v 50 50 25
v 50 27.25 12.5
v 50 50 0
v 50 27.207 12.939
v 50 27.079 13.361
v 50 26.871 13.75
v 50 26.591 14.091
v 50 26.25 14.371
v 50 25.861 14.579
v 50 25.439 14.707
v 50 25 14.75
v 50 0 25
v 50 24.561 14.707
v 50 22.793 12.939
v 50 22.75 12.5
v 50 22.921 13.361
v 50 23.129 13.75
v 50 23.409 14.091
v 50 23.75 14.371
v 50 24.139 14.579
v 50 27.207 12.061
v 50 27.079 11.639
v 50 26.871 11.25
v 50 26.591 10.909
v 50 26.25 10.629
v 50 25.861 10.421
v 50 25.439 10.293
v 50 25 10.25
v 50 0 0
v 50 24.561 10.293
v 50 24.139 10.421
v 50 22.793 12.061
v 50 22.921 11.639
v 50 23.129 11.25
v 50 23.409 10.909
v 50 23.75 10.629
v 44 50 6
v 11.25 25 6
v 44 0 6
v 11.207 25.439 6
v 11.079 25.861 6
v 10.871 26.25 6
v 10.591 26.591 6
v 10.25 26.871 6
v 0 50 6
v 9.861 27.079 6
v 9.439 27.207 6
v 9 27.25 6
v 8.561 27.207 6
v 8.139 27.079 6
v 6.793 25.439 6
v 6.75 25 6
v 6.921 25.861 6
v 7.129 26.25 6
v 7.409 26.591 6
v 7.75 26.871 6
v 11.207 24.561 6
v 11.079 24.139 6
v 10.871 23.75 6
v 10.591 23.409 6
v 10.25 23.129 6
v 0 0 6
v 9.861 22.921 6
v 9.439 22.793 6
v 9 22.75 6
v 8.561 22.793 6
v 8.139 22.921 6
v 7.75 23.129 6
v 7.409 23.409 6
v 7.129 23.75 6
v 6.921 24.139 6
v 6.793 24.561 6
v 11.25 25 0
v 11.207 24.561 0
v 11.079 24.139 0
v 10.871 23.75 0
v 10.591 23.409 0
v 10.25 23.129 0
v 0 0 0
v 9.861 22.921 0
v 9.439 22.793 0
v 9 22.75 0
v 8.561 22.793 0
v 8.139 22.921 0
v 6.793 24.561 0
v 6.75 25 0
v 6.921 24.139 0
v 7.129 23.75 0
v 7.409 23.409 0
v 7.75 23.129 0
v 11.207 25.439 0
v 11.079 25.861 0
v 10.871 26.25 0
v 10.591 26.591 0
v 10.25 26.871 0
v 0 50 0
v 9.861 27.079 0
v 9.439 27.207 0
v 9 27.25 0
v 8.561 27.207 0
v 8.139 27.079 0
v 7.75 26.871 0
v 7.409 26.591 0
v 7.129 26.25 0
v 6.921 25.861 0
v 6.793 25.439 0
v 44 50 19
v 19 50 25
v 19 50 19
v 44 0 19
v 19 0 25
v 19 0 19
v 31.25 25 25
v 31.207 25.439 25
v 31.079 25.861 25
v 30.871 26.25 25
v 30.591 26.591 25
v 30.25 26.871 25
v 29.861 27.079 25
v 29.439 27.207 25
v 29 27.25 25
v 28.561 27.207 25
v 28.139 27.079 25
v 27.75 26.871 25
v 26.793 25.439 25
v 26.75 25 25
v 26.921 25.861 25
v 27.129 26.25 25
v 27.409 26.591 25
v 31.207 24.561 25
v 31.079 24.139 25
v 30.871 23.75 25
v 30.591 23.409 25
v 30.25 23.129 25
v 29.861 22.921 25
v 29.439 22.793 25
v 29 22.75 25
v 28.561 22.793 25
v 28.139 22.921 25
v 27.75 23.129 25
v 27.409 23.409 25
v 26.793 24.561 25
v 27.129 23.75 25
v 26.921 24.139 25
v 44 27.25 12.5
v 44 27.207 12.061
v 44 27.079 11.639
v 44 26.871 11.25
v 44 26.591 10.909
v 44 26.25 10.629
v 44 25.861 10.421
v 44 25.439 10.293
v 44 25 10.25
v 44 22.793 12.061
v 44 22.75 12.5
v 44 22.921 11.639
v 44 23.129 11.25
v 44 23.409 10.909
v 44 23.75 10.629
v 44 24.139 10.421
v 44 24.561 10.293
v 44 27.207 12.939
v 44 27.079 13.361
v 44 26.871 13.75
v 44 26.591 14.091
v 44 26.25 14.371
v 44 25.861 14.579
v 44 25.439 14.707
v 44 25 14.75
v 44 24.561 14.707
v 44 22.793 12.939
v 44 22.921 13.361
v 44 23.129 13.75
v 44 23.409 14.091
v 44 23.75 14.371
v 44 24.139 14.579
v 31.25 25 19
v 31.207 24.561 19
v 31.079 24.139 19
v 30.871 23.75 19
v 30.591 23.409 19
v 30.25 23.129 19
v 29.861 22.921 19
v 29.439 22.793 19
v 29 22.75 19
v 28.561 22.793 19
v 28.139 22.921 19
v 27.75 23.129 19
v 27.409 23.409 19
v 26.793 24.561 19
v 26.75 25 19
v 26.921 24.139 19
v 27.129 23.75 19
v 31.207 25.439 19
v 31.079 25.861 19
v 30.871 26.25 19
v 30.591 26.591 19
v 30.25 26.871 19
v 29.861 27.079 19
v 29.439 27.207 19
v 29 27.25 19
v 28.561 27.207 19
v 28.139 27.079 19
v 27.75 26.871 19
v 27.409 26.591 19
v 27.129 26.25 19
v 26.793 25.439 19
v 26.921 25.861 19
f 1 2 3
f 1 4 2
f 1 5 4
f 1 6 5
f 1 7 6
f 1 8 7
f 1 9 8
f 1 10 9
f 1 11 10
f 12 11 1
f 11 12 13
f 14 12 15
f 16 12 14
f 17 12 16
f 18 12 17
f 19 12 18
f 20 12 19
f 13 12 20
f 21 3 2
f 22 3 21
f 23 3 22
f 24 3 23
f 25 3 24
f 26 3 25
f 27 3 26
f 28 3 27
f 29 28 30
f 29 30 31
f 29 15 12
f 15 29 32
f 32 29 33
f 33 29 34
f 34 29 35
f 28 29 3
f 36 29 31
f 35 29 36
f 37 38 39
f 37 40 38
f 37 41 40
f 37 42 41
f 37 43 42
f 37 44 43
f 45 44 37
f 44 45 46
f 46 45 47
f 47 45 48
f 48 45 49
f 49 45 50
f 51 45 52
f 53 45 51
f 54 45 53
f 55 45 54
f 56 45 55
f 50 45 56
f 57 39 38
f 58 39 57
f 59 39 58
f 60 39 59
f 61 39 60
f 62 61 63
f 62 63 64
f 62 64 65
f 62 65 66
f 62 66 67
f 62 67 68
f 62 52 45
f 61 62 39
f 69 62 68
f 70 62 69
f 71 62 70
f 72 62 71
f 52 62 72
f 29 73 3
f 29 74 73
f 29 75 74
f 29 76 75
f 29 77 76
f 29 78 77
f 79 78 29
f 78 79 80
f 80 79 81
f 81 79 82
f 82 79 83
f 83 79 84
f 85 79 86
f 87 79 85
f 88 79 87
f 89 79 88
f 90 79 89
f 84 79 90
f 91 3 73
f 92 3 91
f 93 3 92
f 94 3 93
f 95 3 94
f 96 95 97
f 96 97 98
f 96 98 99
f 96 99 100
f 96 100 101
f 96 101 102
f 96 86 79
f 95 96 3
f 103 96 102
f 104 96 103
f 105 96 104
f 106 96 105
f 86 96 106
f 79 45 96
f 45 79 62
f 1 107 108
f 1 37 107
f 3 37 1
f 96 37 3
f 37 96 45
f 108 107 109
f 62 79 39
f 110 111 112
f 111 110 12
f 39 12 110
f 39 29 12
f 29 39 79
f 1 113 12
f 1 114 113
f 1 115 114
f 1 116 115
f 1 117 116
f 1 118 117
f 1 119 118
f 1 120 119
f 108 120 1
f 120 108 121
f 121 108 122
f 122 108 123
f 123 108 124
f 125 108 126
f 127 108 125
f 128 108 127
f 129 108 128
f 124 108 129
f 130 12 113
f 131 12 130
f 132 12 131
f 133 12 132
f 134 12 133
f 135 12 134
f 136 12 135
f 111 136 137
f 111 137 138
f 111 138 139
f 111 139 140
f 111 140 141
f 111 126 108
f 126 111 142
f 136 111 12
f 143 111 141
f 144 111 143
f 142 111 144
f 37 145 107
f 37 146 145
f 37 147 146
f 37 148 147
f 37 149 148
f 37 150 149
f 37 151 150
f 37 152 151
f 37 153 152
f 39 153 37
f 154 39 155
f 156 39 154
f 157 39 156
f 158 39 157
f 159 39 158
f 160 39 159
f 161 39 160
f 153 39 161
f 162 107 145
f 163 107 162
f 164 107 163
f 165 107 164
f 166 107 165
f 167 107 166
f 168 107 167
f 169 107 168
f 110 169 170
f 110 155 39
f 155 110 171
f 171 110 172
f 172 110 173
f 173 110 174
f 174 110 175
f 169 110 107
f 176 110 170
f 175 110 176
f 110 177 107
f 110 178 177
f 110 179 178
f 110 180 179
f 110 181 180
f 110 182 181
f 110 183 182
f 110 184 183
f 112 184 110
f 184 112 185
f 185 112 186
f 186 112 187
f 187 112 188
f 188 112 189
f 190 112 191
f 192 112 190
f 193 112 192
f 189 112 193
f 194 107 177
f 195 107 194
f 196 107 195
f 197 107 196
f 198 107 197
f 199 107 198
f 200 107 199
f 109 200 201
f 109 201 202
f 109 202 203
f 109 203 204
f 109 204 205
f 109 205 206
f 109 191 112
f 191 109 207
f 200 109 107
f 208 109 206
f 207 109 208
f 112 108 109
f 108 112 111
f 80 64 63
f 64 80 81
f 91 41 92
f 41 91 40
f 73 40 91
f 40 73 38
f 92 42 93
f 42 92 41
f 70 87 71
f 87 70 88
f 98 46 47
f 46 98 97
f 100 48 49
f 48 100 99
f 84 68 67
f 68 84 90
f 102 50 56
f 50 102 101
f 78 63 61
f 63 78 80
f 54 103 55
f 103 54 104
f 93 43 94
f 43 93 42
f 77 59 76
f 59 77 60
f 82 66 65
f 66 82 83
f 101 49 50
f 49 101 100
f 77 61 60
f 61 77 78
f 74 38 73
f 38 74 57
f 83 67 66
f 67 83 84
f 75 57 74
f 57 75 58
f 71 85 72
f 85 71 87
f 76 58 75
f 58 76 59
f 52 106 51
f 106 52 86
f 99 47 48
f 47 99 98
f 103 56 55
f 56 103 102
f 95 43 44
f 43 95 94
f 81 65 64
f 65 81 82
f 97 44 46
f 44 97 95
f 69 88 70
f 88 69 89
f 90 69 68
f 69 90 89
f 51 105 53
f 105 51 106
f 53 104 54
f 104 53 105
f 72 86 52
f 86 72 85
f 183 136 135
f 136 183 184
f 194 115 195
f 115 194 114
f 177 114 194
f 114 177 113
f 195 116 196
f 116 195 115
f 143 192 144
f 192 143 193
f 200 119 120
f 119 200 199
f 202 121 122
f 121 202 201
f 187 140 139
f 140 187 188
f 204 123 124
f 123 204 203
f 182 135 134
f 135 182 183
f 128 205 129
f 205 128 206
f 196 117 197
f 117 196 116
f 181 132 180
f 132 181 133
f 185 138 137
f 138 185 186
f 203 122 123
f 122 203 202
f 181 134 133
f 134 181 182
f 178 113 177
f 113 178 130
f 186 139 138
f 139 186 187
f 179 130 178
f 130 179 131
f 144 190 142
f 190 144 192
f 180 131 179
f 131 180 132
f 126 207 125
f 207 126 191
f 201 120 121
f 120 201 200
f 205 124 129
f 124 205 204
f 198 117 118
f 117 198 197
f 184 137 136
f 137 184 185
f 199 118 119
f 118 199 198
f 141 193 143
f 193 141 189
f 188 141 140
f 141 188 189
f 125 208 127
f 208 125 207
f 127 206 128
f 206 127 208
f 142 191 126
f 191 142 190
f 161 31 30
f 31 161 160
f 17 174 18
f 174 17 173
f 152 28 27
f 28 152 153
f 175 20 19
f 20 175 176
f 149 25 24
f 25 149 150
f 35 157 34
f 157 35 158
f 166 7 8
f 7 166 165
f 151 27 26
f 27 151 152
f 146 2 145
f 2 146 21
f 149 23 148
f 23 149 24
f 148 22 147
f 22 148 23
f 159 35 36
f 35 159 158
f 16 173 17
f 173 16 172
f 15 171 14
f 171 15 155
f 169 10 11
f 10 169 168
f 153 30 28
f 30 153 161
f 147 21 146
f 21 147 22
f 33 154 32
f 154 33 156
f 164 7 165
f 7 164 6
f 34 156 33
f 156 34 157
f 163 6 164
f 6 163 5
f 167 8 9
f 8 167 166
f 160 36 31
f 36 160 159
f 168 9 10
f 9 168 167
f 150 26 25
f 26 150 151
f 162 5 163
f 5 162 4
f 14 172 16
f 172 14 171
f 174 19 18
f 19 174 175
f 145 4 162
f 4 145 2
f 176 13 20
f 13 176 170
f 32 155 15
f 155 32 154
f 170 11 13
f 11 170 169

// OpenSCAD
$fn = 32;

// ----------------------------------------------------------------------
// Z-bracket: 50 x 50 x 25 mm
// ----------------------------------------------------------------------

// --- parameters (mm) ---
lower_len = 50;           // lower foot length, X
upper_len = 25;           // upper foot length, X
width = 50;               // bracket width, Y
rise = 25;                // overall rise, Z
thick = 6;                // plate thickness
hole_d = 4.5;             // clearance for M4

module hole_z(px, py, z0) {
  translate([px, py, z0 - 2.5]) cylinder(h = thick + 5, d = hole_d);
}
module hole_x(py, pz) {
  translate([-2.5, py, pz]) rotate([0, 90, 0]) cylinder(h = thick + 5, d = hole_d);
}

difference() {
  union() {
    cube([lower_len, width, thick]);
    /* web, overlapping the lower foot */
    translate([lower_len - thick, 0, 0]) cube([thick, width, rise]);
    /* upper foot, sunk into the web */
    translate([lower_len - thick - upper_len, 0, rise - thick]) cube([upper_len + thick, width, thick]);
  }
  hole_z(9, 25, 0);
  translate([lower_len - thick - 15, 0, 0]) hole_z(0, 25, rise - thick);
  translate([lower_len - thick, 0, 0]) hole_x(25, 12.5);
}
